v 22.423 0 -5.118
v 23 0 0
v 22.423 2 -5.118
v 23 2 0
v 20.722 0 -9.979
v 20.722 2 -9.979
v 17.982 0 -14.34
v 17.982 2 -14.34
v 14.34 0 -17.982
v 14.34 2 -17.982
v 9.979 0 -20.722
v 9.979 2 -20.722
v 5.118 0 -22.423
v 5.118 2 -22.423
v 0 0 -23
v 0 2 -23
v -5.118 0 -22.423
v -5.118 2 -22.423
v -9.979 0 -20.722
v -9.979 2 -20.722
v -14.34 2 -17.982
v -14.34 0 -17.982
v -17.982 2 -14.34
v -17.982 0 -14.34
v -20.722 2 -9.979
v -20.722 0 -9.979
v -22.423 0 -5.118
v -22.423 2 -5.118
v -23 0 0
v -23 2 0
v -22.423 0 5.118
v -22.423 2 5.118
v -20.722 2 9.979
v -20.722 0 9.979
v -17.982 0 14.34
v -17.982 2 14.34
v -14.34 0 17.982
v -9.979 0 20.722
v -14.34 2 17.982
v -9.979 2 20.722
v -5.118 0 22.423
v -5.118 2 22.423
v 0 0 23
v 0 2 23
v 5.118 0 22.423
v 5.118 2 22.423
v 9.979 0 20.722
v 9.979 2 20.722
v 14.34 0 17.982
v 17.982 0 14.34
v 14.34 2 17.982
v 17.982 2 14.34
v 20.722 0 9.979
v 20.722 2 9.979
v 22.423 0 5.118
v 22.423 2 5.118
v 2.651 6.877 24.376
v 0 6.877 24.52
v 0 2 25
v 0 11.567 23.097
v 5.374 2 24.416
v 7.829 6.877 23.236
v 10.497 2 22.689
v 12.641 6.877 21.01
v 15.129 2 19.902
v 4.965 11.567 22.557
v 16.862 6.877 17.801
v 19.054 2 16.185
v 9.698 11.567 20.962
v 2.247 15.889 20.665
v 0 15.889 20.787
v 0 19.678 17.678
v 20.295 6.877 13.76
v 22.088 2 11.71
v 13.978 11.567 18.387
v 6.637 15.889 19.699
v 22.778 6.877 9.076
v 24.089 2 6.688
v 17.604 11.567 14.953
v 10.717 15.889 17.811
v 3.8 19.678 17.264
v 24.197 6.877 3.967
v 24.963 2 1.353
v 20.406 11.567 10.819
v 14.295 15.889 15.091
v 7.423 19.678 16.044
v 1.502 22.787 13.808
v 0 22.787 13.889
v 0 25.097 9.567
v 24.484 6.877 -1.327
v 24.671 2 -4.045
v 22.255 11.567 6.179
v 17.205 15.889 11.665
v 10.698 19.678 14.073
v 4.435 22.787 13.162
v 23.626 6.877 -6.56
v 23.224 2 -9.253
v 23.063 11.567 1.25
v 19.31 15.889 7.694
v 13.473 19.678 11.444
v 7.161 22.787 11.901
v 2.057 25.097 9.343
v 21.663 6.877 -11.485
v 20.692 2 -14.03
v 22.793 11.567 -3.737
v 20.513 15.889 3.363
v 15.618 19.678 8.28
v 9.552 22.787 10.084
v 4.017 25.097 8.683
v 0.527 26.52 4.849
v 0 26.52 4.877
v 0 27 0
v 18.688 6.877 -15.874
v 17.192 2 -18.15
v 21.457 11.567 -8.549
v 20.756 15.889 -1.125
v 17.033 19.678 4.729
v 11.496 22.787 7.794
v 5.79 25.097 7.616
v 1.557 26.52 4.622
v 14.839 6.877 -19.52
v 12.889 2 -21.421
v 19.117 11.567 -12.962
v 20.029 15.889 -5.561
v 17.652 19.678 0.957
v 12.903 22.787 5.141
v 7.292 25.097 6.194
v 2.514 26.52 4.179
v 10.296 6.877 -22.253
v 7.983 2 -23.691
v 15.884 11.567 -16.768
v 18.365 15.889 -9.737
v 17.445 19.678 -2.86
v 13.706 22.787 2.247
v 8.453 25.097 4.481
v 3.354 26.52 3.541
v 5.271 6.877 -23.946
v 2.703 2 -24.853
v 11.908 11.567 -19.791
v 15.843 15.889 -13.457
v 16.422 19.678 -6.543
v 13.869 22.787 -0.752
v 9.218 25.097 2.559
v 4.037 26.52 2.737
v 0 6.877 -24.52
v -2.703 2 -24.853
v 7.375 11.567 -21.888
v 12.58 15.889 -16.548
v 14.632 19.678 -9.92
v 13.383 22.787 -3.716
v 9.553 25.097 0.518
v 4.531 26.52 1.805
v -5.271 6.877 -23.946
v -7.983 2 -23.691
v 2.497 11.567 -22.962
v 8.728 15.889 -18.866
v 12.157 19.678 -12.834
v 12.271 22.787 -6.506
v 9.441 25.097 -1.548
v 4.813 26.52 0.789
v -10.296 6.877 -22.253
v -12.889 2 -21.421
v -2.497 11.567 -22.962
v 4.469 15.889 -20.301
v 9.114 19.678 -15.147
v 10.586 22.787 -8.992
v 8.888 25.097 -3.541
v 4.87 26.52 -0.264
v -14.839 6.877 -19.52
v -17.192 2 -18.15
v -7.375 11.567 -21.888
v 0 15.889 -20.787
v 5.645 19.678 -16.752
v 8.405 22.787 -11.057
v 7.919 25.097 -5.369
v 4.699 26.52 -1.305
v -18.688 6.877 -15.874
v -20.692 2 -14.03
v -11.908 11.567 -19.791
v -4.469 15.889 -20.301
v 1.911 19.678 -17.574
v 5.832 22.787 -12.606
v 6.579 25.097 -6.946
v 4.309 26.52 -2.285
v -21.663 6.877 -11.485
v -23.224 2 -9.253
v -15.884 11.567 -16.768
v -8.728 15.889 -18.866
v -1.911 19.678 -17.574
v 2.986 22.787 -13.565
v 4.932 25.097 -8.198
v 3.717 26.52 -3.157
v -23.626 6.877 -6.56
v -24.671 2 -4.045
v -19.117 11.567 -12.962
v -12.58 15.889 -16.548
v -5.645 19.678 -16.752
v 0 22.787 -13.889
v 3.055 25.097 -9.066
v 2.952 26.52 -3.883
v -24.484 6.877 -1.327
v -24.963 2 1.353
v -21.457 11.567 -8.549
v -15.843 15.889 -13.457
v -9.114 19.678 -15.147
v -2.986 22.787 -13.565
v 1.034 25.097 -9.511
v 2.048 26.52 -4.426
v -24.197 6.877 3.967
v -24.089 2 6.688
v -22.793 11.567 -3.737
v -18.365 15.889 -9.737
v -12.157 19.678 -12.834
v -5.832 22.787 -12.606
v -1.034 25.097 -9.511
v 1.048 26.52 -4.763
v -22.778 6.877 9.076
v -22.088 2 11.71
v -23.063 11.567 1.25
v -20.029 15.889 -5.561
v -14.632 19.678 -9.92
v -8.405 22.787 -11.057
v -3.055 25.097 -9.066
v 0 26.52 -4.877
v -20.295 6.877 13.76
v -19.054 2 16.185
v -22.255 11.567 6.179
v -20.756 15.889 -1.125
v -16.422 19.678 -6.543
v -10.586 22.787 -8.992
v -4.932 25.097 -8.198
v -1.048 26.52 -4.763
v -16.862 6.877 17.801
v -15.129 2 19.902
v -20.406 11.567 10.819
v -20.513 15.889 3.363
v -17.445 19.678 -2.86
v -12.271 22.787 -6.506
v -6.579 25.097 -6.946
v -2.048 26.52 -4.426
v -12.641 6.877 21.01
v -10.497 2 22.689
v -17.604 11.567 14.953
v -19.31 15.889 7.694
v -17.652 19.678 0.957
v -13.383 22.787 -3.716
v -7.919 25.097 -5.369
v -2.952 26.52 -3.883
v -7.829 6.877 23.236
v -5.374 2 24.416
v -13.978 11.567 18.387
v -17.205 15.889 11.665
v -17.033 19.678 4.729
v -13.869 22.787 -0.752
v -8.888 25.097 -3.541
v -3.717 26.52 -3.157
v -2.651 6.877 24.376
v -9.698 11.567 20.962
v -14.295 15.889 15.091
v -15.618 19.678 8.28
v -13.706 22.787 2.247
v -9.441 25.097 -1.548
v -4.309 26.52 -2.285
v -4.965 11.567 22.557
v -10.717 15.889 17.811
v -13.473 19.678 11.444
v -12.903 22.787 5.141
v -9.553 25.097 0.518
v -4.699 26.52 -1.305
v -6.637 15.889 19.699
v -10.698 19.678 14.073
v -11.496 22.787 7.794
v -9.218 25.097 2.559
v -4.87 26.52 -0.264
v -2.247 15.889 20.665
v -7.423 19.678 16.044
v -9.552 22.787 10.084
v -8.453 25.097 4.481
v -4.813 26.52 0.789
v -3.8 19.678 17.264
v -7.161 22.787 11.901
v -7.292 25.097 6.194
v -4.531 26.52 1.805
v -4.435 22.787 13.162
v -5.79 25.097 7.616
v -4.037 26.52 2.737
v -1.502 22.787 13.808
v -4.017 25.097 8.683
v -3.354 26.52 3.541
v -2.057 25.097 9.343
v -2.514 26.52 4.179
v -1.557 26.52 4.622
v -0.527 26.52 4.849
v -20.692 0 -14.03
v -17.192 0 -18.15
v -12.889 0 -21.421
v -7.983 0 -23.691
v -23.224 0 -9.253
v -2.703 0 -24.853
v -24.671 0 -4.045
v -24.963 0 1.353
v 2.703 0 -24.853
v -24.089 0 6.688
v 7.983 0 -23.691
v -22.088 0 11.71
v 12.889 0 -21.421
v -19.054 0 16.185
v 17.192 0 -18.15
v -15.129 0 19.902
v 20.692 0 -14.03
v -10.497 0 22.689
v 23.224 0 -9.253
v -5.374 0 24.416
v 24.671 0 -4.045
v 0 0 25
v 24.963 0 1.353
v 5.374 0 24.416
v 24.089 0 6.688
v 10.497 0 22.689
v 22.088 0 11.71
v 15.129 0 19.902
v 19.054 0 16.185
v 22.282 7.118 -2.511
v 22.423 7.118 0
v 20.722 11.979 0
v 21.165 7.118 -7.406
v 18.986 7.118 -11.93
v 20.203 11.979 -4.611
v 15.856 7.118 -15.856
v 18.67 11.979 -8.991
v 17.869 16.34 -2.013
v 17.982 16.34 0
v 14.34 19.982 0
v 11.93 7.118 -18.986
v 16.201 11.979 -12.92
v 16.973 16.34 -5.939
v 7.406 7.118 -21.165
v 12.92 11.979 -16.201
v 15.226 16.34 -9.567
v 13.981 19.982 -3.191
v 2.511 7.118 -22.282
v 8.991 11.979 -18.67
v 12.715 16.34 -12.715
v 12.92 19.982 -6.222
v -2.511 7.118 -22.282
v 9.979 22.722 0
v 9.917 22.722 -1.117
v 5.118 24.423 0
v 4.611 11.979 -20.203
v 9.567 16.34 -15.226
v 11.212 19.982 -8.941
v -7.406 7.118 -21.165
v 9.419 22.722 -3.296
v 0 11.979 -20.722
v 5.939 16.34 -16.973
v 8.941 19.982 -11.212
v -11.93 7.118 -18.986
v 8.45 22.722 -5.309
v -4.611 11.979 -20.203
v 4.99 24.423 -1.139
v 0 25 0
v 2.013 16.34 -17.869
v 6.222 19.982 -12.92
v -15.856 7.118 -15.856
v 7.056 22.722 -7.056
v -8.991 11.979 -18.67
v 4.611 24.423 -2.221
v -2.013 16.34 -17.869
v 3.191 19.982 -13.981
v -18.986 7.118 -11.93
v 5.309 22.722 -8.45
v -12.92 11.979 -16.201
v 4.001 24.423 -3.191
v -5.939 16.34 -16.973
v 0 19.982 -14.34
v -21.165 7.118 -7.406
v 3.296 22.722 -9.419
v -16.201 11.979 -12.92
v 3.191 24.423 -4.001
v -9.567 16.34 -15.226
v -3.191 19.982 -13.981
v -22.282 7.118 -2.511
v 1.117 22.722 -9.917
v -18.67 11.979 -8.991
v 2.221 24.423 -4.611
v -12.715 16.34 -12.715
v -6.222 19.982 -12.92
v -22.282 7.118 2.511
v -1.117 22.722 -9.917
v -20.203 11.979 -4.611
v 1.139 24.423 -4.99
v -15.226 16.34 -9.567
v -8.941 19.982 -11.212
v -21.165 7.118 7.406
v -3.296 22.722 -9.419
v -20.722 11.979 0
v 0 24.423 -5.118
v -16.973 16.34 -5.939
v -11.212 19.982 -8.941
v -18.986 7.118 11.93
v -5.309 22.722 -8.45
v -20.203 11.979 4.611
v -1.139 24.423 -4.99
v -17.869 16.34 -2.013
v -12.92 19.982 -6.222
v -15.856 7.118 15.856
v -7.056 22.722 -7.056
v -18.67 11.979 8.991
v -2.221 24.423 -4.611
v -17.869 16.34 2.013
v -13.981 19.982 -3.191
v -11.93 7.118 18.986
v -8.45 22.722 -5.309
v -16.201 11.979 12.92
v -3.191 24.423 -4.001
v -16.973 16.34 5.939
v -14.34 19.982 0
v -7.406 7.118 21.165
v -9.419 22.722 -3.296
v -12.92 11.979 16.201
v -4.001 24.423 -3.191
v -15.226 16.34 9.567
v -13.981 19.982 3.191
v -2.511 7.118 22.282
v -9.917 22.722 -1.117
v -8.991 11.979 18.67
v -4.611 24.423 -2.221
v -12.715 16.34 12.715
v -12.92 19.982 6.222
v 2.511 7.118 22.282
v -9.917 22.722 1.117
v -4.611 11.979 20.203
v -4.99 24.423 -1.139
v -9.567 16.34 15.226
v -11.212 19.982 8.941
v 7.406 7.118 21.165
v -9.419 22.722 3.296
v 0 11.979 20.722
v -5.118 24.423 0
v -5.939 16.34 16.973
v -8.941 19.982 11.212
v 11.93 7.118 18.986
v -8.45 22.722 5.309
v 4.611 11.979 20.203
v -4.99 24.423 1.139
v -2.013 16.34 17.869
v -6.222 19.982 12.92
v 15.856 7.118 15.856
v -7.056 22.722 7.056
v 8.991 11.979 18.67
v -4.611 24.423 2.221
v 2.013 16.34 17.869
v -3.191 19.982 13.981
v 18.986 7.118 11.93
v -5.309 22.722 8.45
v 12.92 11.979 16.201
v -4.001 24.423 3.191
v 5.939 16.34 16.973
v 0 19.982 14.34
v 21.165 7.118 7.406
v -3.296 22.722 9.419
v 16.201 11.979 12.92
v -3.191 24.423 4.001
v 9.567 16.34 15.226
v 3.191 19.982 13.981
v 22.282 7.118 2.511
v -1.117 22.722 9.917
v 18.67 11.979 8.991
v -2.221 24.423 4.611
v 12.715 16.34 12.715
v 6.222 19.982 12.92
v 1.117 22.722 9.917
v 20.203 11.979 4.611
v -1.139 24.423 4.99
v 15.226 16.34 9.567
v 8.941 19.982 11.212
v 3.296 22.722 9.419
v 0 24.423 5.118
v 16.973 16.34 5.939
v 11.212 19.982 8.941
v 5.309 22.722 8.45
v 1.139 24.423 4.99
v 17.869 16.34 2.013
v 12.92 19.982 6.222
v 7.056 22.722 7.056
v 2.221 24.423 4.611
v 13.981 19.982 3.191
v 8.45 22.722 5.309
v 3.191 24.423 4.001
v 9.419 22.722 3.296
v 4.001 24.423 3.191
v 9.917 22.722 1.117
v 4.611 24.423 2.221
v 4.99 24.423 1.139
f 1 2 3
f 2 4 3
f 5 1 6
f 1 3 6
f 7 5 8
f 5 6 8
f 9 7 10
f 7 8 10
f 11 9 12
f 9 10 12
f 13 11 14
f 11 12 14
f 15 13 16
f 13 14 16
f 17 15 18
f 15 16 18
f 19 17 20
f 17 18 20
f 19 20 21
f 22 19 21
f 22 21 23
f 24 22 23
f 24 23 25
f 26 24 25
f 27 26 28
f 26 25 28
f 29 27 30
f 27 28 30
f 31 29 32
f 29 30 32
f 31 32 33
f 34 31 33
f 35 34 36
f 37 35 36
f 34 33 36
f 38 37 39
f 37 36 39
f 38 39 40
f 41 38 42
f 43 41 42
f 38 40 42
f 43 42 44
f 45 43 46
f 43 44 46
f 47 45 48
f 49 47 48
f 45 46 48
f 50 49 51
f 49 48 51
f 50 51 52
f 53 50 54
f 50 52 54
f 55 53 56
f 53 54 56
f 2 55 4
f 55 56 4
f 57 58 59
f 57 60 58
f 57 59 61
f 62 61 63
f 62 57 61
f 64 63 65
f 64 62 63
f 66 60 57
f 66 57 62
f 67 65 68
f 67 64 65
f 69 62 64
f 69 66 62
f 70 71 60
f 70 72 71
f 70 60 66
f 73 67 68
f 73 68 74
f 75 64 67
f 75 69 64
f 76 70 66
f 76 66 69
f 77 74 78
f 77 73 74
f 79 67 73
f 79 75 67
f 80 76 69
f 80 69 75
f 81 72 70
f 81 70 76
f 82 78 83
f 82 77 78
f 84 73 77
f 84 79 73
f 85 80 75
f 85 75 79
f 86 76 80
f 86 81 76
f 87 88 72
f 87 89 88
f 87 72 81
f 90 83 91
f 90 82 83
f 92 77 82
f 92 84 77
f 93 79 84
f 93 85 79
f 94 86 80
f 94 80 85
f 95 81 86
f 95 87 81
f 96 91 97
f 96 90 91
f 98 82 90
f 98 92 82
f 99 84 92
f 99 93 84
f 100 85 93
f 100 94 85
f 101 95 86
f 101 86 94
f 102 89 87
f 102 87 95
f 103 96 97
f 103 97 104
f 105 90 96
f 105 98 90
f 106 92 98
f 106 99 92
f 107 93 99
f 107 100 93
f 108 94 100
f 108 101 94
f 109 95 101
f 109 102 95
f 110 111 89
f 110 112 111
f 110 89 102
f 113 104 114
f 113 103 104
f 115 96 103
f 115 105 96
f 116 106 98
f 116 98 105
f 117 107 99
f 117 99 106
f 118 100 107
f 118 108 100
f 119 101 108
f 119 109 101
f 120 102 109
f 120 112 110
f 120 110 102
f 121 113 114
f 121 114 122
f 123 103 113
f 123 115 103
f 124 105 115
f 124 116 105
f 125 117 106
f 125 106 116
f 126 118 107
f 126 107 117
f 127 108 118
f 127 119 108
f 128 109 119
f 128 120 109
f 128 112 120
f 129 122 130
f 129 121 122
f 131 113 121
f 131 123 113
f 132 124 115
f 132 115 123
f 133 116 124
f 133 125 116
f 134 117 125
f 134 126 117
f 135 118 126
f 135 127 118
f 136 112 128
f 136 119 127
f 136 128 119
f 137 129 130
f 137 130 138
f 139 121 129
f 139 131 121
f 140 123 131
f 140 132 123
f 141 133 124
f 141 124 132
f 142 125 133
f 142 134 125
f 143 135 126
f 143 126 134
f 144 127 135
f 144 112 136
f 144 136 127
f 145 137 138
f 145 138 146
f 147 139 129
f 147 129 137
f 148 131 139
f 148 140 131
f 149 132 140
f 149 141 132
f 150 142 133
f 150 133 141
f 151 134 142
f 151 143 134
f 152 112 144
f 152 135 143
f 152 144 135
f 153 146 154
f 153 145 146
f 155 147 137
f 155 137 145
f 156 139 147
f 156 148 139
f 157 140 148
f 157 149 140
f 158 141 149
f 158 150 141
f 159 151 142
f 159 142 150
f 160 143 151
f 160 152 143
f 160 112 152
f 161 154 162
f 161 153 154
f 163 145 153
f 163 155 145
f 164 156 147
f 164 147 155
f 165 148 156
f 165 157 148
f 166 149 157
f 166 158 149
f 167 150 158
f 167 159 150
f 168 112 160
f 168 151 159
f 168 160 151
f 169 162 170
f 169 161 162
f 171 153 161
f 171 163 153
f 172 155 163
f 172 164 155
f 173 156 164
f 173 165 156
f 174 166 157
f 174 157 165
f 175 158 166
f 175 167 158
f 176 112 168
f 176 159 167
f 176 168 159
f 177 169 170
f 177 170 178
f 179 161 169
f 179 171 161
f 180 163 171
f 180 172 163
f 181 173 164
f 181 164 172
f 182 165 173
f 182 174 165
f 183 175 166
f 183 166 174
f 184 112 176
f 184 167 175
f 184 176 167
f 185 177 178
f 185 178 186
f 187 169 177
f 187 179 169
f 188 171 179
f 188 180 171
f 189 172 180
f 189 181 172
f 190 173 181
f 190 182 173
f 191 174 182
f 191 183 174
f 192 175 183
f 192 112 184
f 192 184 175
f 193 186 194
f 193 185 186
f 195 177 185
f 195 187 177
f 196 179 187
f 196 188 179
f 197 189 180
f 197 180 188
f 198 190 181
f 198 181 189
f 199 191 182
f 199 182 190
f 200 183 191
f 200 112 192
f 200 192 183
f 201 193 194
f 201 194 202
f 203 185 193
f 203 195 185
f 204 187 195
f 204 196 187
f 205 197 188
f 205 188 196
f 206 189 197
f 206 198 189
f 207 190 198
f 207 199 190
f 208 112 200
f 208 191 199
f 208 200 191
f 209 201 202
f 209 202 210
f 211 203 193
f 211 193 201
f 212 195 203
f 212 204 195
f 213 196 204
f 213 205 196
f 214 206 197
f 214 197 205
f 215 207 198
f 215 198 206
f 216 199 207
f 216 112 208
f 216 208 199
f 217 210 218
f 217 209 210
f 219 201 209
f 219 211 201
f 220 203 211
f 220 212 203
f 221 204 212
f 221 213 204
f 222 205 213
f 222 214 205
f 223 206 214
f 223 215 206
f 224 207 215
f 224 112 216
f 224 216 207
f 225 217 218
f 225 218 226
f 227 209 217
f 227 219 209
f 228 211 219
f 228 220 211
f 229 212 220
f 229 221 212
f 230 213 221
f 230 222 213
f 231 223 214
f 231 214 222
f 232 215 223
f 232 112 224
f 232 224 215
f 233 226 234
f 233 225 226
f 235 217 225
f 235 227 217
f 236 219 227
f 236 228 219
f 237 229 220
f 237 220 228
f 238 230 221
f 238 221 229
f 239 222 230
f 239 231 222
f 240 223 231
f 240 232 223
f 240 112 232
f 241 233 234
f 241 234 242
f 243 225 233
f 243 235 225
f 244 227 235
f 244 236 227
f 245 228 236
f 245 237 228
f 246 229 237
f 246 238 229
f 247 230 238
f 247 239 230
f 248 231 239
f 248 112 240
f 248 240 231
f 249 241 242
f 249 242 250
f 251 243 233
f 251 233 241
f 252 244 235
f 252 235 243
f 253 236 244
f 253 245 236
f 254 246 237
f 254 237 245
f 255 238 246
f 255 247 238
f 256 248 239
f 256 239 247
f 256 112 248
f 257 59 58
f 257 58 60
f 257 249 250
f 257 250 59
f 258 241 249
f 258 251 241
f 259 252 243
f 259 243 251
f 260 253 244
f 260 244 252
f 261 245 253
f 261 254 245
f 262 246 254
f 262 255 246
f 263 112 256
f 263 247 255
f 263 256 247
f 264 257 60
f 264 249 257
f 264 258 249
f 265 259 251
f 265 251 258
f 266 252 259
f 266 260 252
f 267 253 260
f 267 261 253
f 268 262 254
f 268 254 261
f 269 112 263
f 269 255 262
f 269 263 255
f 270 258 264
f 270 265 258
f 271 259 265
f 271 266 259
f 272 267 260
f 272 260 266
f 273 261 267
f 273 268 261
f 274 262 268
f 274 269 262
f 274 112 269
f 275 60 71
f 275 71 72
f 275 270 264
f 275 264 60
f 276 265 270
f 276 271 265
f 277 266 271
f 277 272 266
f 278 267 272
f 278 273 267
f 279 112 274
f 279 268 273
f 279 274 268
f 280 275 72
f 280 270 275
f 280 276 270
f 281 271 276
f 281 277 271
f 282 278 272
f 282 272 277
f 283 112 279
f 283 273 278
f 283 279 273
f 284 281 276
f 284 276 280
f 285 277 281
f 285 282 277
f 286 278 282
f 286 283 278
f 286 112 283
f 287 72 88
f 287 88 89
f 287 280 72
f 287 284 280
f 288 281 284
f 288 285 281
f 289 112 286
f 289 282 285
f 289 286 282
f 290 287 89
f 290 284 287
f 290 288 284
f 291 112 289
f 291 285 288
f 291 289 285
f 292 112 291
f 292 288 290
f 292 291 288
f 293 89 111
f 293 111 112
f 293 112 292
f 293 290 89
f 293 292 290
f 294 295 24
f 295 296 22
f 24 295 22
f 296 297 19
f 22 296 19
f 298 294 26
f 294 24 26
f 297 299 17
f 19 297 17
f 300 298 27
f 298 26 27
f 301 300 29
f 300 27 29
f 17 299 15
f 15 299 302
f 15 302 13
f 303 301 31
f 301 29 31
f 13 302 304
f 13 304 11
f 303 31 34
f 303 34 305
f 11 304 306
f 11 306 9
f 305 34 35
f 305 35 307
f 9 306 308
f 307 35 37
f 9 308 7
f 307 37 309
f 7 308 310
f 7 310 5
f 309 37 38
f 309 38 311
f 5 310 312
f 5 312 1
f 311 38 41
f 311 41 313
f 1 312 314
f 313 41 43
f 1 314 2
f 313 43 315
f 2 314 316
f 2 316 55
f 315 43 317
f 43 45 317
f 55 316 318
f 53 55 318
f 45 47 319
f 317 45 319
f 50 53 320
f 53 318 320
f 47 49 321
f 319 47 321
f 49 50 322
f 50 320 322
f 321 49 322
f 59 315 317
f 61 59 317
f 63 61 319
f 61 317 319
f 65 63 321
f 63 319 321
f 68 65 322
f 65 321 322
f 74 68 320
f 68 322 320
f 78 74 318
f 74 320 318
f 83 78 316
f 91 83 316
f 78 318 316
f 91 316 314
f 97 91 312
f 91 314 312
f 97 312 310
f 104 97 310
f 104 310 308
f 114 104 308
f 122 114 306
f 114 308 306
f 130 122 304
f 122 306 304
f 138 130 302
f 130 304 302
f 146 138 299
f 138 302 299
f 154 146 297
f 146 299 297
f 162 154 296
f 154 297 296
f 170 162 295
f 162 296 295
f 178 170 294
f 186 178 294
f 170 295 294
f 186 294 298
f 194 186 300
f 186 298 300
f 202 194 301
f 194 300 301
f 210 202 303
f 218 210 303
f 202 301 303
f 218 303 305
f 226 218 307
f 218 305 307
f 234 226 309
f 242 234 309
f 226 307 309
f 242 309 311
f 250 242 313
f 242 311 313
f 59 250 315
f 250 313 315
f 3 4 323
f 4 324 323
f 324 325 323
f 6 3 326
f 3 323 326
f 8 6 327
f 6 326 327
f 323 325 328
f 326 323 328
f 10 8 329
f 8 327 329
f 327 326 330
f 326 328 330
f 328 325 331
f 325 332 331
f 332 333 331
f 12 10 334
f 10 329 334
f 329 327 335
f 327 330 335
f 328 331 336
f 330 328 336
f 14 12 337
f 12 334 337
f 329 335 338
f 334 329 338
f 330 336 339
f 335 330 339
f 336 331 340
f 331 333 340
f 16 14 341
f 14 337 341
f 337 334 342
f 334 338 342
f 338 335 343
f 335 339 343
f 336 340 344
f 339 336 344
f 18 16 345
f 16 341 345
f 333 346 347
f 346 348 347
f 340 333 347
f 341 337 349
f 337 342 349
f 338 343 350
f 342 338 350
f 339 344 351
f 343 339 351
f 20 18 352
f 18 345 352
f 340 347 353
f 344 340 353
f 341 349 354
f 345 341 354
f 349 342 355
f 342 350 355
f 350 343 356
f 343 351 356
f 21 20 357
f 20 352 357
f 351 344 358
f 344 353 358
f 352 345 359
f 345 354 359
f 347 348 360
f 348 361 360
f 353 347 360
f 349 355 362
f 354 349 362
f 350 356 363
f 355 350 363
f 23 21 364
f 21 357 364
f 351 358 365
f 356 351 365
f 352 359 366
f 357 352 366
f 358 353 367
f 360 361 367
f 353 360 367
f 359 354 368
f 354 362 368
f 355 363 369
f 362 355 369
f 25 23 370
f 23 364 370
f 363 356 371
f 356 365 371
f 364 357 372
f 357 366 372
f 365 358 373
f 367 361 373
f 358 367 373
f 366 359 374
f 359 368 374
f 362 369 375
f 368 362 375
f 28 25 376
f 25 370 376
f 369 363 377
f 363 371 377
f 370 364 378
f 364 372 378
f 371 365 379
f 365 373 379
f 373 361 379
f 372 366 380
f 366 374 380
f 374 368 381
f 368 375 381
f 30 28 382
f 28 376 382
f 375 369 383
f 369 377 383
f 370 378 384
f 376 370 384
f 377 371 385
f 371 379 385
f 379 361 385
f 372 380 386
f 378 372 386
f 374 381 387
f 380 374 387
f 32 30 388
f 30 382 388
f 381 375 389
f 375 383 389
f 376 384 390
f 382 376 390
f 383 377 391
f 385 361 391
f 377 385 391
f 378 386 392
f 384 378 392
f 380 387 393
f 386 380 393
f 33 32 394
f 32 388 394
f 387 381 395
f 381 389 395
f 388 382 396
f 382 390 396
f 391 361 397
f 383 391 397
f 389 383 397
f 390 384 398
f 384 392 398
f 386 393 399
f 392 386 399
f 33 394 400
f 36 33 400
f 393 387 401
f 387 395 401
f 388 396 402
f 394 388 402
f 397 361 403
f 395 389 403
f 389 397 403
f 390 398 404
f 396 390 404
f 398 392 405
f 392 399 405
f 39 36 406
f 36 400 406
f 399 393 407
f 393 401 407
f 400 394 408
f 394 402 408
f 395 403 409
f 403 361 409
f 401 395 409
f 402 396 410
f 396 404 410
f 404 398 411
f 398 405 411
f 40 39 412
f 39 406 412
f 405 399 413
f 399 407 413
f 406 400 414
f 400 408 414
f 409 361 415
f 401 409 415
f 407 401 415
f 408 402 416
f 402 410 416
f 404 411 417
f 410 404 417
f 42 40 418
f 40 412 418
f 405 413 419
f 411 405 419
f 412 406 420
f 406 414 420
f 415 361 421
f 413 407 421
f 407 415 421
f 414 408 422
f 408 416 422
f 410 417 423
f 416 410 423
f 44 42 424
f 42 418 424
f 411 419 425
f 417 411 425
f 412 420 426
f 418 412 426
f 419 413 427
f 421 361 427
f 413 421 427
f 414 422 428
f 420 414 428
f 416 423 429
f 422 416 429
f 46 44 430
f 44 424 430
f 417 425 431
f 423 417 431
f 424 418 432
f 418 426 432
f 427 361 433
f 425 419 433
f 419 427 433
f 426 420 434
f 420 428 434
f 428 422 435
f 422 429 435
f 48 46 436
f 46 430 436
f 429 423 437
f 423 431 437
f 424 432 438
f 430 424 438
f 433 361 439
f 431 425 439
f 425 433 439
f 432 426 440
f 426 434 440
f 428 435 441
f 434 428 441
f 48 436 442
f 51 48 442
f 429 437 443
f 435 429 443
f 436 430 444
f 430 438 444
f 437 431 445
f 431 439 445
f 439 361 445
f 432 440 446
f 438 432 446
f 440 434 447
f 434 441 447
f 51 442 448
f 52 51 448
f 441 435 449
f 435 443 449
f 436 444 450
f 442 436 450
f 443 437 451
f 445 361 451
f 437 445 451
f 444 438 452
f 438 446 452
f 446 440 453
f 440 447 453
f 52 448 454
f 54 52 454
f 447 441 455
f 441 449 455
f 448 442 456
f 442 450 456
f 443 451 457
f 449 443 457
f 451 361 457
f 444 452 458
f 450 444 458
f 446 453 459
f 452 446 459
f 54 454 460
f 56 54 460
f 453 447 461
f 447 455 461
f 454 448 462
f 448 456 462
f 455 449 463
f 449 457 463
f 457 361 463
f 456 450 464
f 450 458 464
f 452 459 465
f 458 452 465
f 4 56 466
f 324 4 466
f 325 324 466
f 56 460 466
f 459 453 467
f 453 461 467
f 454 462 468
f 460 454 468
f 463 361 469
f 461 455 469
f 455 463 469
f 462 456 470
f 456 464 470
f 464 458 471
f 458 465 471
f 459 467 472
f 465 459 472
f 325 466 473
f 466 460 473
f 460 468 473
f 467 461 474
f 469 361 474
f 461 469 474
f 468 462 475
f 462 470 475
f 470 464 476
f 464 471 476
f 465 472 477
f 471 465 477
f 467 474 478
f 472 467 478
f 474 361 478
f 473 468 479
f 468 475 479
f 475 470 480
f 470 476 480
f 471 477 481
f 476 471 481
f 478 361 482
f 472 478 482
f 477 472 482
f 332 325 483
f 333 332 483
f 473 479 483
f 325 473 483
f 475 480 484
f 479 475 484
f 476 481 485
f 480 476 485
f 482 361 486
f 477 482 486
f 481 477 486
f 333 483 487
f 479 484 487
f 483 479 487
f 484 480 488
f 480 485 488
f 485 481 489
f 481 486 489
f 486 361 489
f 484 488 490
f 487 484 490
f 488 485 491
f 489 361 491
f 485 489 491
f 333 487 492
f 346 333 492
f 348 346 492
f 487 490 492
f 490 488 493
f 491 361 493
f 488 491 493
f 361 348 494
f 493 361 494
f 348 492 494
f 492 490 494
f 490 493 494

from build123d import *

# Parameters (mm, degrees)
SKETCH1_R           = 25
BOSS_EXTRUDE1_DEPTH = 2
DOME1_FACE_RADIUS   = 25
DOME1_HEIGHT        = 25


# Read off the part's stored shape, not the designer's step: Shell1
with BuildPart() as part:
    # Sketch1 → Boss-Extrude1 (new body)
    with BuildSketch(Plane(origin=(0, 0, 0), x_dir=(1, 0, 0), z_dir=(0, 1, 0))):
        with Locations(Location((0, 0, 0), (0, 0, 270))):
            Circle(SKETCH1_R)
    extrude(amount=BOSS_EXTRUDE1_DEPTH)

    # Dome1: a dome of height H over a round flat face of radius A is a cap of a sphere of radius (A * A + H * H) / (2 * H)
    dome1_r = (DOME1_FACE_RADIUS * DOME1_FACE_RADIUS + DOME1_HEIGHT * DOME1_HEIGHT) / (2 * DOME1_HEIGHT)
    dome1_base = Plane((0, 2, 0), z_dir=(0, 1, 0))
    with Locations(dome1_base.offset(DOME1_HEIGHT - dome1_r)):
        dome1_ball = Sphere(dome1_r, mode=Mode.PRIVATE)
    add(split(dome1_ball, bisect_by=dome1_base, keep=Keep.TOP, mode=Mode.PRIVATE))

    # Shell1 outline → Shell1 (revolve, cut)
    with BuildSketch(Plane.XY):
        with BuildLine():
            Line((23, 0), (23, 1.999999977))
            ThreePointArc((23, 1.999999977), (16.263455975, 18.263455959), (0, 25))
            Line((0, 25), (0, 0))
            Line((0, 0), (23, 0))
        make_face()
    revolve(axis=Axis((0, 0, 0), (0, 1, 0)), mode=Mode.SUBTRACT)


solid = part.part
